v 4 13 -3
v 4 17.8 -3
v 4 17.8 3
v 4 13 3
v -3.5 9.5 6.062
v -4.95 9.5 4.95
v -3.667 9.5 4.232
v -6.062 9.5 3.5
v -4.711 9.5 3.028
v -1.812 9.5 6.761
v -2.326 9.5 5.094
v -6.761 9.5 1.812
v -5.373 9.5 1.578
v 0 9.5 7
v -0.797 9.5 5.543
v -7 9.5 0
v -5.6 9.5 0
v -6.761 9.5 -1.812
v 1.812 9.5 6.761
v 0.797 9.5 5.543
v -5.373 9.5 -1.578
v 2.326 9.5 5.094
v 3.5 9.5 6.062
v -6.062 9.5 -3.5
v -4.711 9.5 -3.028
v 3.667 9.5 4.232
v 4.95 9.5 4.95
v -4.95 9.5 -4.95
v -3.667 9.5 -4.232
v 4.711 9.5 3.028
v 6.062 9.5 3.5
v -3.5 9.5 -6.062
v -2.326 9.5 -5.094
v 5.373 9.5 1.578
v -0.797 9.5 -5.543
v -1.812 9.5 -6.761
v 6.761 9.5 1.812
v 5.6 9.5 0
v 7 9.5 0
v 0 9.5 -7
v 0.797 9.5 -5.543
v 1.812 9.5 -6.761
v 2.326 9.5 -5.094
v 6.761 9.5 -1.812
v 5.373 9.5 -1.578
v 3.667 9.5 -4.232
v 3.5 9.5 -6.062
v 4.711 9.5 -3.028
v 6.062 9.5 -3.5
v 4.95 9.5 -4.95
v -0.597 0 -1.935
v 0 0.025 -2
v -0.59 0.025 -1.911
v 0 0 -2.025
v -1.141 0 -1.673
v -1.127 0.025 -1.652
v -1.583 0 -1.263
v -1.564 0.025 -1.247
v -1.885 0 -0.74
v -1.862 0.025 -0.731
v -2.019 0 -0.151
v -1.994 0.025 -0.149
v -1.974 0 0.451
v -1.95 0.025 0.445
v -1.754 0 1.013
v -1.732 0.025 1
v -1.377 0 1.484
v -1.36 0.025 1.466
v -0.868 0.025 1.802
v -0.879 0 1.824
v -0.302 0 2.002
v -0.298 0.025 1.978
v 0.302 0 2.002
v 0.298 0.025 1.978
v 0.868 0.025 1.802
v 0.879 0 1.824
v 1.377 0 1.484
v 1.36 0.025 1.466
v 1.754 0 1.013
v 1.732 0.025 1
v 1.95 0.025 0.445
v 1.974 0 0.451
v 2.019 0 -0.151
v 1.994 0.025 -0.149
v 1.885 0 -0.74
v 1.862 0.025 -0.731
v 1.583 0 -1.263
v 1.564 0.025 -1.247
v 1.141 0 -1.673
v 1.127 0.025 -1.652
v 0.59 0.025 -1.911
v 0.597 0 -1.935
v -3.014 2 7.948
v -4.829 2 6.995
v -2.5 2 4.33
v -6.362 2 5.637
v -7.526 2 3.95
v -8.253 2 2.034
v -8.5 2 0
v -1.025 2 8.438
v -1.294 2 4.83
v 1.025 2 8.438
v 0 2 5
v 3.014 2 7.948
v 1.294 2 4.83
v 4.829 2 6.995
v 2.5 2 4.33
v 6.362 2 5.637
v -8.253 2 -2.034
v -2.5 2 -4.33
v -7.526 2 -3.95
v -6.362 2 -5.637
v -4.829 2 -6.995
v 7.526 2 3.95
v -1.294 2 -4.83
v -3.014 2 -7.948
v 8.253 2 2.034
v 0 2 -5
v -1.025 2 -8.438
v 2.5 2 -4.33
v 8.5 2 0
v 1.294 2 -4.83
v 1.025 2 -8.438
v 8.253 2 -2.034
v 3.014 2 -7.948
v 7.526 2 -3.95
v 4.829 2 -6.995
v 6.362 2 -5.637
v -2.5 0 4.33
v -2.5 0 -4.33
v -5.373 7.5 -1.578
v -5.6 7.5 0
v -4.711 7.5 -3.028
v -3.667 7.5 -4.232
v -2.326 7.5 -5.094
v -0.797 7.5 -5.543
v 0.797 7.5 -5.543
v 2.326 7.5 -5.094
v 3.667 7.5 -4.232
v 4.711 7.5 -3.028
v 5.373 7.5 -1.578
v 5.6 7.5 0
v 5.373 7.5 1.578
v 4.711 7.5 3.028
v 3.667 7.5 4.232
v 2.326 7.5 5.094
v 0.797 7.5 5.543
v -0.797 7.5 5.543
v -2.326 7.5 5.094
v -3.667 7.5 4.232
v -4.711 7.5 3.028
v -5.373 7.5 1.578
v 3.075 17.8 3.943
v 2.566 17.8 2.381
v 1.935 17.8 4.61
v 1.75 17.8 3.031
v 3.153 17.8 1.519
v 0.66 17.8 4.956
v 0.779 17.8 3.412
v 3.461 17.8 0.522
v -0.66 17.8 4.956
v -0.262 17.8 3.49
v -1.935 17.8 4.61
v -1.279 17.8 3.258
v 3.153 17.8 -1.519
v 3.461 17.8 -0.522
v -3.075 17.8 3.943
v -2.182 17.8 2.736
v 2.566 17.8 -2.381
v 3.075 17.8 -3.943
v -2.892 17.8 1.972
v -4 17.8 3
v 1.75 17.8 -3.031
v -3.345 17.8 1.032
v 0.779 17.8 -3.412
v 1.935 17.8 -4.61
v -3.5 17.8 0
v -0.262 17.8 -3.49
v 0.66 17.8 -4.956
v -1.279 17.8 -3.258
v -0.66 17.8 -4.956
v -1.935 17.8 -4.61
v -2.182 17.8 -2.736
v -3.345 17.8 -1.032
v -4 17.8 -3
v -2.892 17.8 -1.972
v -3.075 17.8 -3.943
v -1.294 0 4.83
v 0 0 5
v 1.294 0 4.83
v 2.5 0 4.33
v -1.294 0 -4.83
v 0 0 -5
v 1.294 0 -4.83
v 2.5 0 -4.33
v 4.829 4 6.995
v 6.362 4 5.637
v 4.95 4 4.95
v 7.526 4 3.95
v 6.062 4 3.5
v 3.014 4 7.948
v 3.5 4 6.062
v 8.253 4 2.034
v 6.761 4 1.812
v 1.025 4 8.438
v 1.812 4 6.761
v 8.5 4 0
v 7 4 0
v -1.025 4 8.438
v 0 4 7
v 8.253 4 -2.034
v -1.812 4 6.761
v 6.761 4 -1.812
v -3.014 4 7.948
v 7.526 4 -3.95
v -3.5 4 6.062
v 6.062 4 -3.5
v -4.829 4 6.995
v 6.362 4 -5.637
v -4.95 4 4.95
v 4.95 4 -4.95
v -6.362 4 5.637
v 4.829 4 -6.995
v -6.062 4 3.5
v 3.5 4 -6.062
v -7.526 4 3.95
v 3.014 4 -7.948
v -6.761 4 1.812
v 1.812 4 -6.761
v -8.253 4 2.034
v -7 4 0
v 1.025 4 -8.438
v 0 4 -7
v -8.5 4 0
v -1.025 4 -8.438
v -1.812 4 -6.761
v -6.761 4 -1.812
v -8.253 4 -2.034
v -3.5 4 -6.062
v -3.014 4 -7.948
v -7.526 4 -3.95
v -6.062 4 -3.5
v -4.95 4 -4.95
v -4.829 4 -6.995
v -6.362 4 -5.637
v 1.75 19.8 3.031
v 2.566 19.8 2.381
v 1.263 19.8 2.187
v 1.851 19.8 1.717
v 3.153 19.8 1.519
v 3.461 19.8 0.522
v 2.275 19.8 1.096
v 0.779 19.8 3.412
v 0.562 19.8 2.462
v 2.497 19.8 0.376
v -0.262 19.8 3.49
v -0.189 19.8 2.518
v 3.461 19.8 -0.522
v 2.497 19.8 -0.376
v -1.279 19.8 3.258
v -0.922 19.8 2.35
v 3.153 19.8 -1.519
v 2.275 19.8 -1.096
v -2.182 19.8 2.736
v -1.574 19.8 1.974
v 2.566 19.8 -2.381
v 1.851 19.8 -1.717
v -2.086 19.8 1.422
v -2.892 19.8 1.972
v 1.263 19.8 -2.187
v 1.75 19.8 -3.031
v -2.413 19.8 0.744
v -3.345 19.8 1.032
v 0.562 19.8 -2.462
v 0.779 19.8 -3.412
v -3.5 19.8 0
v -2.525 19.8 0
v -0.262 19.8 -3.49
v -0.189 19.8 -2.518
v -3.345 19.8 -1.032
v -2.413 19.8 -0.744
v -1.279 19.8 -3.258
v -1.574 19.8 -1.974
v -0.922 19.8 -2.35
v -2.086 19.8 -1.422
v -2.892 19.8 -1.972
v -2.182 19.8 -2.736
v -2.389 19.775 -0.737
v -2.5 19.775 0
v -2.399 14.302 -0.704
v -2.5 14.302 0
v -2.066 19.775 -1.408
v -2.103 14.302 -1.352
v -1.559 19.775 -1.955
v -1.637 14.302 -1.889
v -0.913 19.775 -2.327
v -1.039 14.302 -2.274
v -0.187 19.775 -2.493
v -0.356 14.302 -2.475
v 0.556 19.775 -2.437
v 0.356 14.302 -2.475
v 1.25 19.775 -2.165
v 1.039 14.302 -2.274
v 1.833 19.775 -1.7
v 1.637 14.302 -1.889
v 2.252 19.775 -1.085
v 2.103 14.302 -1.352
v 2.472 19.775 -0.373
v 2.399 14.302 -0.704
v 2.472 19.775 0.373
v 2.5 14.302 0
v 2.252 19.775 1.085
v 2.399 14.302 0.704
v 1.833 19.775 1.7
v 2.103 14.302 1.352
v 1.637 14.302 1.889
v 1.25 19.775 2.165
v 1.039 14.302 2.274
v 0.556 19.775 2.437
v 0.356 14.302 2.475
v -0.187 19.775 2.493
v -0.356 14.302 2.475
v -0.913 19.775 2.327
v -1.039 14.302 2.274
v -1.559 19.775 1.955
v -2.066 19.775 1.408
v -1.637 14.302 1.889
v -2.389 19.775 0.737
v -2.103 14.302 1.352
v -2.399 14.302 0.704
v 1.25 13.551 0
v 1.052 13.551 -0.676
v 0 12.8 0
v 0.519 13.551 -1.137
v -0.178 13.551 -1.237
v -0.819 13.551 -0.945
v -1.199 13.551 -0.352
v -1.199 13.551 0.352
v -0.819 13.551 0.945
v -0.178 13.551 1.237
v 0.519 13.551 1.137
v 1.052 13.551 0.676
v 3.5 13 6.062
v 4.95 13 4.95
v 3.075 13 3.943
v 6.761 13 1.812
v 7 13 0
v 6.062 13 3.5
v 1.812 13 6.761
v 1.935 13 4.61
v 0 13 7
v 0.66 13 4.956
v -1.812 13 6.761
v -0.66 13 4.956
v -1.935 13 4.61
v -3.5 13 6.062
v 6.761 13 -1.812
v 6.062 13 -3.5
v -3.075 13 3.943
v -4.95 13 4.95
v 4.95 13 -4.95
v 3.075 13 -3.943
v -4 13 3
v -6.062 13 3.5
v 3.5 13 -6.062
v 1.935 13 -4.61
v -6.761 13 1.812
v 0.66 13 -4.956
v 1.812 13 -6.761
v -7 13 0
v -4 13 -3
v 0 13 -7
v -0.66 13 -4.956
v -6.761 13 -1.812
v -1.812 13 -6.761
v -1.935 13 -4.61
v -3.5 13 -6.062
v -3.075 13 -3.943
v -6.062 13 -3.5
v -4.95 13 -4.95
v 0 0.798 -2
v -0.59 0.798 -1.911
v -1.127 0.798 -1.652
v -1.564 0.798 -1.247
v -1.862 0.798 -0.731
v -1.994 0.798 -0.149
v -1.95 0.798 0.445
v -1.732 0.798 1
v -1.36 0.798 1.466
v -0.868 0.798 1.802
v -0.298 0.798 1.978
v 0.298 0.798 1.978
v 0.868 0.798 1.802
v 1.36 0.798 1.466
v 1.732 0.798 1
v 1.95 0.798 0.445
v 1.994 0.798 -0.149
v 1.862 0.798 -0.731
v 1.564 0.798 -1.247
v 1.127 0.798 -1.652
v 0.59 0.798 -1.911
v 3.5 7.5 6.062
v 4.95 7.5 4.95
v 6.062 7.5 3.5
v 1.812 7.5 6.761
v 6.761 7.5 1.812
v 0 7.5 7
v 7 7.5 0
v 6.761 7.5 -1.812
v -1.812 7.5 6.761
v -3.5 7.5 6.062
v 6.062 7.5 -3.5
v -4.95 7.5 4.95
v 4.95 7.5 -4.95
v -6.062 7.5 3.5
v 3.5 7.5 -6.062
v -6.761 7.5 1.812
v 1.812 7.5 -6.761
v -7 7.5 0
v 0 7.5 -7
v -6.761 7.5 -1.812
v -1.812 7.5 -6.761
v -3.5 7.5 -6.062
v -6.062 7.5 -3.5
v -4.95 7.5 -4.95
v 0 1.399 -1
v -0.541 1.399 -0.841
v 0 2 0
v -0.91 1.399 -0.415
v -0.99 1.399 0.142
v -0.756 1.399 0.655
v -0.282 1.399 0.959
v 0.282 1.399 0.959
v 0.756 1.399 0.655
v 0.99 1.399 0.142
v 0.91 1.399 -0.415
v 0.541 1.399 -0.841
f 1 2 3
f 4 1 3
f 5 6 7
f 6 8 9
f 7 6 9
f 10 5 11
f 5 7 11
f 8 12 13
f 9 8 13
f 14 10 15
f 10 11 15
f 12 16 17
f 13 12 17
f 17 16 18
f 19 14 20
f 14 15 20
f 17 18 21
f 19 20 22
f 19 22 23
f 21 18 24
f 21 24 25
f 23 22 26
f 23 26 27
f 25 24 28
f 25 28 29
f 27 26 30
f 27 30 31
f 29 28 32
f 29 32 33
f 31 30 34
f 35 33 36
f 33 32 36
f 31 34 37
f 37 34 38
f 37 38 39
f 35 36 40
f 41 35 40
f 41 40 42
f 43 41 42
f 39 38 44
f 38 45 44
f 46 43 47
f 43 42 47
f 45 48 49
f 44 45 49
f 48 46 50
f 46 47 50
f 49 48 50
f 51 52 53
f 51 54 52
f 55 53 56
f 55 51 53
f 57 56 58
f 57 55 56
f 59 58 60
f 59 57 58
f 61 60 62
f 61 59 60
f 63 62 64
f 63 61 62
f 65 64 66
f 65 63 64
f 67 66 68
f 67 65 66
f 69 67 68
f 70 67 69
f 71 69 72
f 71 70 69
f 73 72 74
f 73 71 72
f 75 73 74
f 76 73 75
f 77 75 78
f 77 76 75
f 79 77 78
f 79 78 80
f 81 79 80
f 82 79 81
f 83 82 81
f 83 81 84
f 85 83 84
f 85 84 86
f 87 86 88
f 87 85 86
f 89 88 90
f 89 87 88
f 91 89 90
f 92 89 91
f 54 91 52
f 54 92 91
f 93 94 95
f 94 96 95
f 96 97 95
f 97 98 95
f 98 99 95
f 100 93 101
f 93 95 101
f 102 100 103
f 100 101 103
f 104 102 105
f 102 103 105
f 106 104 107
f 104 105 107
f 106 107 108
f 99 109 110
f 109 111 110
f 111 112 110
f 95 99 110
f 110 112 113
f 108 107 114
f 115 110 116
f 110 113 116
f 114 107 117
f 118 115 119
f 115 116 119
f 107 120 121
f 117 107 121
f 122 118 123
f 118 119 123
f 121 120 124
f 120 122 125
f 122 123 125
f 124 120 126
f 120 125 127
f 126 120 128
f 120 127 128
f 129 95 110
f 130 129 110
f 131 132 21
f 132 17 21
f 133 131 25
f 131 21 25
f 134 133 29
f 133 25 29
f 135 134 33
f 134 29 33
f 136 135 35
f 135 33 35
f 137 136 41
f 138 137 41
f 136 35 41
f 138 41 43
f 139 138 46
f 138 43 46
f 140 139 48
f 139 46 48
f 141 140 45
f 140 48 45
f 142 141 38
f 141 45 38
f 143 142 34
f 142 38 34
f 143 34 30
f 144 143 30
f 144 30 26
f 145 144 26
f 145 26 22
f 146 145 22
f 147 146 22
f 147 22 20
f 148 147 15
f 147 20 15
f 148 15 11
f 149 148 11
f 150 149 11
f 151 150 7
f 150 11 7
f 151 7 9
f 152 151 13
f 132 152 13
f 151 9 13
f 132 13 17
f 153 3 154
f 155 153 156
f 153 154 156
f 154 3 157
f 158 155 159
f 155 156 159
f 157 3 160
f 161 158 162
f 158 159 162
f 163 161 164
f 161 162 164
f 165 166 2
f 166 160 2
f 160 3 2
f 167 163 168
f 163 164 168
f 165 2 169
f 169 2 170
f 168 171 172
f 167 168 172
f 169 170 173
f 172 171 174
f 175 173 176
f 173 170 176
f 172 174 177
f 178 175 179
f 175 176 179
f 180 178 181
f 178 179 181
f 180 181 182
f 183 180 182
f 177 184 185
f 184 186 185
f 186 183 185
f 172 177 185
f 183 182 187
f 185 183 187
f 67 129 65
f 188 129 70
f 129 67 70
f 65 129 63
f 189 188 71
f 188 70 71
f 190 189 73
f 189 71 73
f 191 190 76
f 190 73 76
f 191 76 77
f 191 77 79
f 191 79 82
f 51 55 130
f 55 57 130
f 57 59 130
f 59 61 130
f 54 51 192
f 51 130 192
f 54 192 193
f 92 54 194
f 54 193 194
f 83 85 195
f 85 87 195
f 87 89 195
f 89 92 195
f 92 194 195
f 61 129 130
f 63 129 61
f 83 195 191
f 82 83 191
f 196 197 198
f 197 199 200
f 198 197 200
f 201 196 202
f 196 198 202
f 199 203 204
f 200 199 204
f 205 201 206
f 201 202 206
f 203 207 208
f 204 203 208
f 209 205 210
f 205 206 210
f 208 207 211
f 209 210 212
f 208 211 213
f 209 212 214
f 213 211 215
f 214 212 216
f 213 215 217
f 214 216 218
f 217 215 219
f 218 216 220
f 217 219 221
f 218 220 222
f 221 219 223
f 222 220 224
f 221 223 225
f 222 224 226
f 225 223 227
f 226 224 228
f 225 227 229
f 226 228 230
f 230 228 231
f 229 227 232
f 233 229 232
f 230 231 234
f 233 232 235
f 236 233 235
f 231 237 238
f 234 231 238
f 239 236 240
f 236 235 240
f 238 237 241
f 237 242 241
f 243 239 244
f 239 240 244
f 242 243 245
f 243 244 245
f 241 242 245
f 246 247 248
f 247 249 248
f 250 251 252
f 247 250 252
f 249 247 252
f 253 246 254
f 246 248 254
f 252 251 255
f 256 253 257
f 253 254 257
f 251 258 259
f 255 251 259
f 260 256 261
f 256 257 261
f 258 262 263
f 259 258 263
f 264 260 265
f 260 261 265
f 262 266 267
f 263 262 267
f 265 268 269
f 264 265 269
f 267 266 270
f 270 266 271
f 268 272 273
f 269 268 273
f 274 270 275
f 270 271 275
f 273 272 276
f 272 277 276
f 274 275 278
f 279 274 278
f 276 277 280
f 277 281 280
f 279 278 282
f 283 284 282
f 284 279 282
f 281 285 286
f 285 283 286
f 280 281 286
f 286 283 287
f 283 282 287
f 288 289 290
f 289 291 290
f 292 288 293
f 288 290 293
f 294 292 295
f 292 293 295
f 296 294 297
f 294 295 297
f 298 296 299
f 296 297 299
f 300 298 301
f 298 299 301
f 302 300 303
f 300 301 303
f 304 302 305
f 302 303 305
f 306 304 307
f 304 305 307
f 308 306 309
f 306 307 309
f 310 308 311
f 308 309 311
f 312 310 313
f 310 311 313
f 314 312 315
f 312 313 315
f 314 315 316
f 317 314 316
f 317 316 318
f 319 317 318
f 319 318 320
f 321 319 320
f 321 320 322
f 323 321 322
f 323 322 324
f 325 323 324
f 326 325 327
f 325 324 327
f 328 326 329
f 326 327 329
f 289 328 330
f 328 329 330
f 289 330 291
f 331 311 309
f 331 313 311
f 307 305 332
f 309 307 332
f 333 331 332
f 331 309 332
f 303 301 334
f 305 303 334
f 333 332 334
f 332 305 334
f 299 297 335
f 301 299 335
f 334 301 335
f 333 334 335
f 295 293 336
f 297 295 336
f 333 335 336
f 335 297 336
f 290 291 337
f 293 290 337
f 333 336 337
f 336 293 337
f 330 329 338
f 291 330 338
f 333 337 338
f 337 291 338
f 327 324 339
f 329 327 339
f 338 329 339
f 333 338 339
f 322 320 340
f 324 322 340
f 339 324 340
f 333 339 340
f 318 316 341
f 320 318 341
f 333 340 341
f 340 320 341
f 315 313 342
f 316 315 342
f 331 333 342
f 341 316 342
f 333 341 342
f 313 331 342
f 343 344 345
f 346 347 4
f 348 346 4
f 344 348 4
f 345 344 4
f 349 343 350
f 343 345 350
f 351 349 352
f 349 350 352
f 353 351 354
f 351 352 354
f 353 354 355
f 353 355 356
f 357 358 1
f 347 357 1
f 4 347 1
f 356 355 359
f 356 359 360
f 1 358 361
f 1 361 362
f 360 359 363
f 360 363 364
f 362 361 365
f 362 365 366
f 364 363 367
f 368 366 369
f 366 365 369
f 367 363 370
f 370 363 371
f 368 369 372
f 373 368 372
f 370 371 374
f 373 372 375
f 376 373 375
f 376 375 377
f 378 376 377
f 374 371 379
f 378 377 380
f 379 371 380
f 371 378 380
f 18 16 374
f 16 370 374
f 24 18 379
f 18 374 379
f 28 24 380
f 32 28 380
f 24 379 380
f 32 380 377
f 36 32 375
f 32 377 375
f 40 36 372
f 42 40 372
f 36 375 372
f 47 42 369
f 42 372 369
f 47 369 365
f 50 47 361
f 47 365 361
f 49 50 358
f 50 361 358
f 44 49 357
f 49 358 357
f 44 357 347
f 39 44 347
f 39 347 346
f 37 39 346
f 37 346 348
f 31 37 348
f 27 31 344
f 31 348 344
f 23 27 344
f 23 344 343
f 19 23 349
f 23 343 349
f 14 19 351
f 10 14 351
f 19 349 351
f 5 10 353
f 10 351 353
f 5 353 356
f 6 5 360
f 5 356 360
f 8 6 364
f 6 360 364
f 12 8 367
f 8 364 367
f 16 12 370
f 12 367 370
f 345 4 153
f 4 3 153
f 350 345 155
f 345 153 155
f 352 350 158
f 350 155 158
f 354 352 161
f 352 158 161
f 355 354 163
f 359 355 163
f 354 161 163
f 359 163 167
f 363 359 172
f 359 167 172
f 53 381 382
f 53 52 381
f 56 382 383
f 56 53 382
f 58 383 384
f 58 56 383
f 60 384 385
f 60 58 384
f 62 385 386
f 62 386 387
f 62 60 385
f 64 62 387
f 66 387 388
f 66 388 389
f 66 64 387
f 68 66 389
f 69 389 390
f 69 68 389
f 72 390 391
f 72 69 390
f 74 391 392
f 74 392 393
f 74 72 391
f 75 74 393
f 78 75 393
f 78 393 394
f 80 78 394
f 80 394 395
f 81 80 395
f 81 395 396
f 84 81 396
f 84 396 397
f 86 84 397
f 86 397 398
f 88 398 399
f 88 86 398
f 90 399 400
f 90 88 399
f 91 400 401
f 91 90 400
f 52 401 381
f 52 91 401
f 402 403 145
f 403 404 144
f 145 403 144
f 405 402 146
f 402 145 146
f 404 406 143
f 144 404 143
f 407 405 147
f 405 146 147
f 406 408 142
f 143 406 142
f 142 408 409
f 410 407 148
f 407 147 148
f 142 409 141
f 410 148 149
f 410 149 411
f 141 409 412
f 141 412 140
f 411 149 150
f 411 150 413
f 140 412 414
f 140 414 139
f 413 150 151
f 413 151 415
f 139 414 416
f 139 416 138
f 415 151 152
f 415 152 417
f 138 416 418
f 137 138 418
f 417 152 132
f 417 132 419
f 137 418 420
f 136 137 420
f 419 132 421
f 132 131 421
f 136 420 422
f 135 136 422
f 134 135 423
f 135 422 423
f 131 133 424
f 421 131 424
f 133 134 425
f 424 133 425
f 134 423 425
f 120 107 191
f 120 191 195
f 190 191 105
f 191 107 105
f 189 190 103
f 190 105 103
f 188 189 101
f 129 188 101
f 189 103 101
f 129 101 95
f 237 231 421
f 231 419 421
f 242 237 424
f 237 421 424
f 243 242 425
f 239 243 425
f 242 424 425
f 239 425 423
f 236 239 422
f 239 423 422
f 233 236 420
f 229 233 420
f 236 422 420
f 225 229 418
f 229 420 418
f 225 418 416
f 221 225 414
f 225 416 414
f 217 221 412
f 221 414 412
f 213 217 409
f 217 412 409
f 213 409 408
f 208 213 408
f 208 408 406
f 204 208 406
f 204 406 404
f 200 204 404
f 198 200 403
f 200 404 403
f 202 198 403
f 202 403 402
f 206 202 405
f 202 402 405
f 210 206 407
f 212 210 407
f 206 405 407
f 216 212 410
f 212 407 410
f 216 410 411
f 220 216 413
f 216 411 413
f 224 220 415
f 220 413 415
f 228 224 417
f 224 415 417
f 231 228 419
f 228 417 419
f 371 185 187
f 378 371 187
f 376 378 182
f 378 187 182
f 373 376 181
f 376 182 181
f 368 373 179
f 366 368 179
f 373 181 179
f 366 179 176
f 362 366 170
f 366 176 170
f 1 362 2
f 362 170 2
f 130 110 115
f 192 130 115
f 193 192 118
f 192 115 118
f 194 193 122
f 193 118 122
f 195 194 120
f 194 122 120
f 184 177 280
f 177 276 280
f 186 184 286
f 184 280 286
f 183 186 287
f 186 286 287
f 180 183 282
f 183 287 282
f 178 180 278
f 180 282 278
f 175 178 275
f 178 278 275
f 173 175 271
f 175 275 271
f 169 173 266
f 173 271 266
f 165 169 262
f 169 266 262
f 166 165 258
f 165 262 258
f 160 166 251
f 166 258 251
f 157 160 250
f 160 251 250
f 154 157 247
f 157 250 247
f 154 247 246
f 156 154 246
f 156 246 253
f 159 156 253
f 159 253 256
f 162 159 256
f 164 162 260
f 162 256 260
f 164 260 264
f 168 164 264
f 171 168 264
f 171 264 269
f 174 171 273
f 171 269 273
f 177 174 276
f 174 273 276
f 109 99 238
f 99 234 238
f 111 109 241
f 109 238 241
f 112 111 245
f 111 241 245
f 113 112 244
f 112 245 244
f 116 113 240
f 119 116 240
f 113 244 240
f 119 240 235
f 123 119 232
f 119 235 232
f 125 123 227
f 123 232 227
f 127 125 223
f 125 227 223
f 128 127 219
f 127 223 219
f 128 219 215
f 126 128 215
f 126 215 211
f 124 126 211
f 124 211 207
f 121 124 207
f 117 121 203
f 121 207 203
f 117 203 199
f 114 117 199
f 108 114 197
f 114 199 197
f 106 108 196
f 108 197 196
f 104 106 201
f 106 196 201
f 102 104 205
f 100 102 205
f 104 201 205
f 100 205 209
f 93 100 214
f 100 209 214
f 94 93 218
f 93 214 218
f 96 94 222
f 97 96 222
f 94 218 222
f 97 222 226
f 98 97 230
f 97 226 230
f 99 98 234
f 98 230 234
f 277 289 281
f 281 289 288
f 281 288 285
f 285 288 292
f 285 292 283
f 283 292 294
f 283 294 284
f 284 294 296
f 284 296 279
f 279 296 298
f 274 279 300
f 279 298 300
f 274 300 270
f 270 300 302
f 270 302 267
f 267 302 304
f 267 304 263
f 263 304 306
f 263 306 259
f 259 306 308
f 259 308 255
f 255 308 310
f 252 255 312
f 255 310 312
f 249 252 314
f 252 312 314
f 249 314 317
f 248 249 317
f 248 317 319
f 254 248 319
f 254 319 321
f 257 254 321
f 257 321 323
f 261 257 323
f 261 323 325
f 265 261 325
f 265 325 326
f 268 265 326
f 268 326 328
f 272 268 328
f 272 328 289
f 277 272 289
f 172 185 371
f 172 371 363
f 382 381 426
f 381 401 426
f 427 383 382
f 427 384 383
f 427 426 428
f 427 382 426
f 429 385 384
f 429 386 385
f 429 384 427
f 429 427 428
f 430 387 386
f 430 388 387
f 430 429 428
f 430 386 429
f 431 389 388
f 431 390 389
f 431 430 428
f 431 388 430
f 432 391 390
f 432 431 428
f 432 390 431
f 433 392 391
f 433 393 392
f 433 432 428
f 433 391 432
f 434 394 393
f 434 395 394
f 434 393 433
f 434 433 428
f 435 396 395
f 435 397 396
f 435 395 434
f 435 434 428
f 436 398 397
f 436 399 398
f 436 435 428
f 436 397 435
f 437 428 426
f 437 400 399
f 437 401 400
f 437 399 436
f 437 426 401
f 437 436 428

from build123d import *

# Parameters (mm, degrees)
CUT_EXTRUDE_1_DEPTH = 4.8
CUT_EXTRUDE_START   = -2
CUT_EXTRUDE_2_DEPTH = 2
MM_1_D              = 5
MM_1_DEPTH          = 5.497848452
MM_1_CSINK_D        = 5.05
MM_1_CSINK_ANGLE    = 90
MM_1_TIP            = 1.502151548


with BuildPart() as part:
    # 草图1 → 旋转1 (revolve)
    with BuildSketch(Plane.XY, mode=Mode.PRIVATE) as revolve_1_sk:
        Polygon((0, 0), (5, 0), (5, 2), (8.5, 2), (8.5, 4), (7, 4), (7, 7.5), (5.6, 7.5), (5.6, 9.5), (7, 9.5), (7, 13), (5, 13), (5, 17.8), (3.5, 17.8), (3.5, 19.8), (0, 19.8), align=None)
    revolve(revolve_1_sk.sketch.rotate(Axis((0, 19.8, 0), (0, -1, 0)), 180), axis=Axis((0, 19.8, 0), (0, -1, 0)))

    # 草图3 → 切除-拉伸1 (cut)
    with BuildSketch(Plane(origin=(0, 17.8, 0), x_dir=(1, 0, 0), z_dir=(0, 1, 0))):
        with BuildLine():
            Line((-4, 3), (-4, -3))
            ThreePointArc((-4, -3), (-5, 0), (-4, 3))
        make_face()
        with BuildLine():
            Line((4, 3), (4, -3))
            ThreePointArc((4, -3), (5, 0), (4, 3))
        make_face()
    extrude(amount=-CUT_EXTRUDE_1_DEPTH, mode=Mode.SUBTRACT)

    # 草图4 → 切除-拉伸2 (cut)
    with BuildSketch(Plane.XZ.offset(CUT_EXTRUDE_START)):
        with BuildLine():
            Line((-2.5, 4.330127019), (-2.5, -4.330127019))
            ThreePointArc((-2.5, -4.330127019), (-5, 0), (-2.5, 4.330127019))
        make_face()
        with BuildLine():
            Line((2.5, 4.330127019), (2.5, -4.330127019))
            ThreePointArc((2.5, -4.330127019), (5, 0), (2.5, 4.330127019))
        make_face()
    extrude(amount=CUT_EXTRUDE_2_DEPTH, mode=Mode.SUBTRACT)

    # 草图6 → 大小mm 暗销孔2 (revolve, cut)
    with BuildSketch(Plane(origin=(0, 0, 0), x_dir=(0, 0, -1), z_dir=(1, 0, 0))):
        Polygon((0, 0), (0, 2), (2, 0.798278762), (2, 0.025), (2.025, 0), align=None)
    revolve(axis=Axis((0, -6.35, 0), (0, 1, 0)), mode=Mode.SUBTRACT)

    # 大小mm 暗销孔1
    with Locations(Plane(origin=(0, 19.8, 0), x_dir=(1, 0, 0), z_dir=(0, 1, 0))):
        with Locations((0, 0)):
            CounterSinkHole(MM_1_D / 2, MM_1_CSINK_D / 2, depth=MM_1_DEPTH, counter_sink_angle=MM_1_CSINK_ANGLE)
            with Locations((0, 0, -(MM_1_DEPTH + MM_1_TIP / 2))):  # 118° drill point
                Cone(0, MM_1_D / 2, MM_1_TIP, mode=Mode.SUBTRACT)


solid = part.part
